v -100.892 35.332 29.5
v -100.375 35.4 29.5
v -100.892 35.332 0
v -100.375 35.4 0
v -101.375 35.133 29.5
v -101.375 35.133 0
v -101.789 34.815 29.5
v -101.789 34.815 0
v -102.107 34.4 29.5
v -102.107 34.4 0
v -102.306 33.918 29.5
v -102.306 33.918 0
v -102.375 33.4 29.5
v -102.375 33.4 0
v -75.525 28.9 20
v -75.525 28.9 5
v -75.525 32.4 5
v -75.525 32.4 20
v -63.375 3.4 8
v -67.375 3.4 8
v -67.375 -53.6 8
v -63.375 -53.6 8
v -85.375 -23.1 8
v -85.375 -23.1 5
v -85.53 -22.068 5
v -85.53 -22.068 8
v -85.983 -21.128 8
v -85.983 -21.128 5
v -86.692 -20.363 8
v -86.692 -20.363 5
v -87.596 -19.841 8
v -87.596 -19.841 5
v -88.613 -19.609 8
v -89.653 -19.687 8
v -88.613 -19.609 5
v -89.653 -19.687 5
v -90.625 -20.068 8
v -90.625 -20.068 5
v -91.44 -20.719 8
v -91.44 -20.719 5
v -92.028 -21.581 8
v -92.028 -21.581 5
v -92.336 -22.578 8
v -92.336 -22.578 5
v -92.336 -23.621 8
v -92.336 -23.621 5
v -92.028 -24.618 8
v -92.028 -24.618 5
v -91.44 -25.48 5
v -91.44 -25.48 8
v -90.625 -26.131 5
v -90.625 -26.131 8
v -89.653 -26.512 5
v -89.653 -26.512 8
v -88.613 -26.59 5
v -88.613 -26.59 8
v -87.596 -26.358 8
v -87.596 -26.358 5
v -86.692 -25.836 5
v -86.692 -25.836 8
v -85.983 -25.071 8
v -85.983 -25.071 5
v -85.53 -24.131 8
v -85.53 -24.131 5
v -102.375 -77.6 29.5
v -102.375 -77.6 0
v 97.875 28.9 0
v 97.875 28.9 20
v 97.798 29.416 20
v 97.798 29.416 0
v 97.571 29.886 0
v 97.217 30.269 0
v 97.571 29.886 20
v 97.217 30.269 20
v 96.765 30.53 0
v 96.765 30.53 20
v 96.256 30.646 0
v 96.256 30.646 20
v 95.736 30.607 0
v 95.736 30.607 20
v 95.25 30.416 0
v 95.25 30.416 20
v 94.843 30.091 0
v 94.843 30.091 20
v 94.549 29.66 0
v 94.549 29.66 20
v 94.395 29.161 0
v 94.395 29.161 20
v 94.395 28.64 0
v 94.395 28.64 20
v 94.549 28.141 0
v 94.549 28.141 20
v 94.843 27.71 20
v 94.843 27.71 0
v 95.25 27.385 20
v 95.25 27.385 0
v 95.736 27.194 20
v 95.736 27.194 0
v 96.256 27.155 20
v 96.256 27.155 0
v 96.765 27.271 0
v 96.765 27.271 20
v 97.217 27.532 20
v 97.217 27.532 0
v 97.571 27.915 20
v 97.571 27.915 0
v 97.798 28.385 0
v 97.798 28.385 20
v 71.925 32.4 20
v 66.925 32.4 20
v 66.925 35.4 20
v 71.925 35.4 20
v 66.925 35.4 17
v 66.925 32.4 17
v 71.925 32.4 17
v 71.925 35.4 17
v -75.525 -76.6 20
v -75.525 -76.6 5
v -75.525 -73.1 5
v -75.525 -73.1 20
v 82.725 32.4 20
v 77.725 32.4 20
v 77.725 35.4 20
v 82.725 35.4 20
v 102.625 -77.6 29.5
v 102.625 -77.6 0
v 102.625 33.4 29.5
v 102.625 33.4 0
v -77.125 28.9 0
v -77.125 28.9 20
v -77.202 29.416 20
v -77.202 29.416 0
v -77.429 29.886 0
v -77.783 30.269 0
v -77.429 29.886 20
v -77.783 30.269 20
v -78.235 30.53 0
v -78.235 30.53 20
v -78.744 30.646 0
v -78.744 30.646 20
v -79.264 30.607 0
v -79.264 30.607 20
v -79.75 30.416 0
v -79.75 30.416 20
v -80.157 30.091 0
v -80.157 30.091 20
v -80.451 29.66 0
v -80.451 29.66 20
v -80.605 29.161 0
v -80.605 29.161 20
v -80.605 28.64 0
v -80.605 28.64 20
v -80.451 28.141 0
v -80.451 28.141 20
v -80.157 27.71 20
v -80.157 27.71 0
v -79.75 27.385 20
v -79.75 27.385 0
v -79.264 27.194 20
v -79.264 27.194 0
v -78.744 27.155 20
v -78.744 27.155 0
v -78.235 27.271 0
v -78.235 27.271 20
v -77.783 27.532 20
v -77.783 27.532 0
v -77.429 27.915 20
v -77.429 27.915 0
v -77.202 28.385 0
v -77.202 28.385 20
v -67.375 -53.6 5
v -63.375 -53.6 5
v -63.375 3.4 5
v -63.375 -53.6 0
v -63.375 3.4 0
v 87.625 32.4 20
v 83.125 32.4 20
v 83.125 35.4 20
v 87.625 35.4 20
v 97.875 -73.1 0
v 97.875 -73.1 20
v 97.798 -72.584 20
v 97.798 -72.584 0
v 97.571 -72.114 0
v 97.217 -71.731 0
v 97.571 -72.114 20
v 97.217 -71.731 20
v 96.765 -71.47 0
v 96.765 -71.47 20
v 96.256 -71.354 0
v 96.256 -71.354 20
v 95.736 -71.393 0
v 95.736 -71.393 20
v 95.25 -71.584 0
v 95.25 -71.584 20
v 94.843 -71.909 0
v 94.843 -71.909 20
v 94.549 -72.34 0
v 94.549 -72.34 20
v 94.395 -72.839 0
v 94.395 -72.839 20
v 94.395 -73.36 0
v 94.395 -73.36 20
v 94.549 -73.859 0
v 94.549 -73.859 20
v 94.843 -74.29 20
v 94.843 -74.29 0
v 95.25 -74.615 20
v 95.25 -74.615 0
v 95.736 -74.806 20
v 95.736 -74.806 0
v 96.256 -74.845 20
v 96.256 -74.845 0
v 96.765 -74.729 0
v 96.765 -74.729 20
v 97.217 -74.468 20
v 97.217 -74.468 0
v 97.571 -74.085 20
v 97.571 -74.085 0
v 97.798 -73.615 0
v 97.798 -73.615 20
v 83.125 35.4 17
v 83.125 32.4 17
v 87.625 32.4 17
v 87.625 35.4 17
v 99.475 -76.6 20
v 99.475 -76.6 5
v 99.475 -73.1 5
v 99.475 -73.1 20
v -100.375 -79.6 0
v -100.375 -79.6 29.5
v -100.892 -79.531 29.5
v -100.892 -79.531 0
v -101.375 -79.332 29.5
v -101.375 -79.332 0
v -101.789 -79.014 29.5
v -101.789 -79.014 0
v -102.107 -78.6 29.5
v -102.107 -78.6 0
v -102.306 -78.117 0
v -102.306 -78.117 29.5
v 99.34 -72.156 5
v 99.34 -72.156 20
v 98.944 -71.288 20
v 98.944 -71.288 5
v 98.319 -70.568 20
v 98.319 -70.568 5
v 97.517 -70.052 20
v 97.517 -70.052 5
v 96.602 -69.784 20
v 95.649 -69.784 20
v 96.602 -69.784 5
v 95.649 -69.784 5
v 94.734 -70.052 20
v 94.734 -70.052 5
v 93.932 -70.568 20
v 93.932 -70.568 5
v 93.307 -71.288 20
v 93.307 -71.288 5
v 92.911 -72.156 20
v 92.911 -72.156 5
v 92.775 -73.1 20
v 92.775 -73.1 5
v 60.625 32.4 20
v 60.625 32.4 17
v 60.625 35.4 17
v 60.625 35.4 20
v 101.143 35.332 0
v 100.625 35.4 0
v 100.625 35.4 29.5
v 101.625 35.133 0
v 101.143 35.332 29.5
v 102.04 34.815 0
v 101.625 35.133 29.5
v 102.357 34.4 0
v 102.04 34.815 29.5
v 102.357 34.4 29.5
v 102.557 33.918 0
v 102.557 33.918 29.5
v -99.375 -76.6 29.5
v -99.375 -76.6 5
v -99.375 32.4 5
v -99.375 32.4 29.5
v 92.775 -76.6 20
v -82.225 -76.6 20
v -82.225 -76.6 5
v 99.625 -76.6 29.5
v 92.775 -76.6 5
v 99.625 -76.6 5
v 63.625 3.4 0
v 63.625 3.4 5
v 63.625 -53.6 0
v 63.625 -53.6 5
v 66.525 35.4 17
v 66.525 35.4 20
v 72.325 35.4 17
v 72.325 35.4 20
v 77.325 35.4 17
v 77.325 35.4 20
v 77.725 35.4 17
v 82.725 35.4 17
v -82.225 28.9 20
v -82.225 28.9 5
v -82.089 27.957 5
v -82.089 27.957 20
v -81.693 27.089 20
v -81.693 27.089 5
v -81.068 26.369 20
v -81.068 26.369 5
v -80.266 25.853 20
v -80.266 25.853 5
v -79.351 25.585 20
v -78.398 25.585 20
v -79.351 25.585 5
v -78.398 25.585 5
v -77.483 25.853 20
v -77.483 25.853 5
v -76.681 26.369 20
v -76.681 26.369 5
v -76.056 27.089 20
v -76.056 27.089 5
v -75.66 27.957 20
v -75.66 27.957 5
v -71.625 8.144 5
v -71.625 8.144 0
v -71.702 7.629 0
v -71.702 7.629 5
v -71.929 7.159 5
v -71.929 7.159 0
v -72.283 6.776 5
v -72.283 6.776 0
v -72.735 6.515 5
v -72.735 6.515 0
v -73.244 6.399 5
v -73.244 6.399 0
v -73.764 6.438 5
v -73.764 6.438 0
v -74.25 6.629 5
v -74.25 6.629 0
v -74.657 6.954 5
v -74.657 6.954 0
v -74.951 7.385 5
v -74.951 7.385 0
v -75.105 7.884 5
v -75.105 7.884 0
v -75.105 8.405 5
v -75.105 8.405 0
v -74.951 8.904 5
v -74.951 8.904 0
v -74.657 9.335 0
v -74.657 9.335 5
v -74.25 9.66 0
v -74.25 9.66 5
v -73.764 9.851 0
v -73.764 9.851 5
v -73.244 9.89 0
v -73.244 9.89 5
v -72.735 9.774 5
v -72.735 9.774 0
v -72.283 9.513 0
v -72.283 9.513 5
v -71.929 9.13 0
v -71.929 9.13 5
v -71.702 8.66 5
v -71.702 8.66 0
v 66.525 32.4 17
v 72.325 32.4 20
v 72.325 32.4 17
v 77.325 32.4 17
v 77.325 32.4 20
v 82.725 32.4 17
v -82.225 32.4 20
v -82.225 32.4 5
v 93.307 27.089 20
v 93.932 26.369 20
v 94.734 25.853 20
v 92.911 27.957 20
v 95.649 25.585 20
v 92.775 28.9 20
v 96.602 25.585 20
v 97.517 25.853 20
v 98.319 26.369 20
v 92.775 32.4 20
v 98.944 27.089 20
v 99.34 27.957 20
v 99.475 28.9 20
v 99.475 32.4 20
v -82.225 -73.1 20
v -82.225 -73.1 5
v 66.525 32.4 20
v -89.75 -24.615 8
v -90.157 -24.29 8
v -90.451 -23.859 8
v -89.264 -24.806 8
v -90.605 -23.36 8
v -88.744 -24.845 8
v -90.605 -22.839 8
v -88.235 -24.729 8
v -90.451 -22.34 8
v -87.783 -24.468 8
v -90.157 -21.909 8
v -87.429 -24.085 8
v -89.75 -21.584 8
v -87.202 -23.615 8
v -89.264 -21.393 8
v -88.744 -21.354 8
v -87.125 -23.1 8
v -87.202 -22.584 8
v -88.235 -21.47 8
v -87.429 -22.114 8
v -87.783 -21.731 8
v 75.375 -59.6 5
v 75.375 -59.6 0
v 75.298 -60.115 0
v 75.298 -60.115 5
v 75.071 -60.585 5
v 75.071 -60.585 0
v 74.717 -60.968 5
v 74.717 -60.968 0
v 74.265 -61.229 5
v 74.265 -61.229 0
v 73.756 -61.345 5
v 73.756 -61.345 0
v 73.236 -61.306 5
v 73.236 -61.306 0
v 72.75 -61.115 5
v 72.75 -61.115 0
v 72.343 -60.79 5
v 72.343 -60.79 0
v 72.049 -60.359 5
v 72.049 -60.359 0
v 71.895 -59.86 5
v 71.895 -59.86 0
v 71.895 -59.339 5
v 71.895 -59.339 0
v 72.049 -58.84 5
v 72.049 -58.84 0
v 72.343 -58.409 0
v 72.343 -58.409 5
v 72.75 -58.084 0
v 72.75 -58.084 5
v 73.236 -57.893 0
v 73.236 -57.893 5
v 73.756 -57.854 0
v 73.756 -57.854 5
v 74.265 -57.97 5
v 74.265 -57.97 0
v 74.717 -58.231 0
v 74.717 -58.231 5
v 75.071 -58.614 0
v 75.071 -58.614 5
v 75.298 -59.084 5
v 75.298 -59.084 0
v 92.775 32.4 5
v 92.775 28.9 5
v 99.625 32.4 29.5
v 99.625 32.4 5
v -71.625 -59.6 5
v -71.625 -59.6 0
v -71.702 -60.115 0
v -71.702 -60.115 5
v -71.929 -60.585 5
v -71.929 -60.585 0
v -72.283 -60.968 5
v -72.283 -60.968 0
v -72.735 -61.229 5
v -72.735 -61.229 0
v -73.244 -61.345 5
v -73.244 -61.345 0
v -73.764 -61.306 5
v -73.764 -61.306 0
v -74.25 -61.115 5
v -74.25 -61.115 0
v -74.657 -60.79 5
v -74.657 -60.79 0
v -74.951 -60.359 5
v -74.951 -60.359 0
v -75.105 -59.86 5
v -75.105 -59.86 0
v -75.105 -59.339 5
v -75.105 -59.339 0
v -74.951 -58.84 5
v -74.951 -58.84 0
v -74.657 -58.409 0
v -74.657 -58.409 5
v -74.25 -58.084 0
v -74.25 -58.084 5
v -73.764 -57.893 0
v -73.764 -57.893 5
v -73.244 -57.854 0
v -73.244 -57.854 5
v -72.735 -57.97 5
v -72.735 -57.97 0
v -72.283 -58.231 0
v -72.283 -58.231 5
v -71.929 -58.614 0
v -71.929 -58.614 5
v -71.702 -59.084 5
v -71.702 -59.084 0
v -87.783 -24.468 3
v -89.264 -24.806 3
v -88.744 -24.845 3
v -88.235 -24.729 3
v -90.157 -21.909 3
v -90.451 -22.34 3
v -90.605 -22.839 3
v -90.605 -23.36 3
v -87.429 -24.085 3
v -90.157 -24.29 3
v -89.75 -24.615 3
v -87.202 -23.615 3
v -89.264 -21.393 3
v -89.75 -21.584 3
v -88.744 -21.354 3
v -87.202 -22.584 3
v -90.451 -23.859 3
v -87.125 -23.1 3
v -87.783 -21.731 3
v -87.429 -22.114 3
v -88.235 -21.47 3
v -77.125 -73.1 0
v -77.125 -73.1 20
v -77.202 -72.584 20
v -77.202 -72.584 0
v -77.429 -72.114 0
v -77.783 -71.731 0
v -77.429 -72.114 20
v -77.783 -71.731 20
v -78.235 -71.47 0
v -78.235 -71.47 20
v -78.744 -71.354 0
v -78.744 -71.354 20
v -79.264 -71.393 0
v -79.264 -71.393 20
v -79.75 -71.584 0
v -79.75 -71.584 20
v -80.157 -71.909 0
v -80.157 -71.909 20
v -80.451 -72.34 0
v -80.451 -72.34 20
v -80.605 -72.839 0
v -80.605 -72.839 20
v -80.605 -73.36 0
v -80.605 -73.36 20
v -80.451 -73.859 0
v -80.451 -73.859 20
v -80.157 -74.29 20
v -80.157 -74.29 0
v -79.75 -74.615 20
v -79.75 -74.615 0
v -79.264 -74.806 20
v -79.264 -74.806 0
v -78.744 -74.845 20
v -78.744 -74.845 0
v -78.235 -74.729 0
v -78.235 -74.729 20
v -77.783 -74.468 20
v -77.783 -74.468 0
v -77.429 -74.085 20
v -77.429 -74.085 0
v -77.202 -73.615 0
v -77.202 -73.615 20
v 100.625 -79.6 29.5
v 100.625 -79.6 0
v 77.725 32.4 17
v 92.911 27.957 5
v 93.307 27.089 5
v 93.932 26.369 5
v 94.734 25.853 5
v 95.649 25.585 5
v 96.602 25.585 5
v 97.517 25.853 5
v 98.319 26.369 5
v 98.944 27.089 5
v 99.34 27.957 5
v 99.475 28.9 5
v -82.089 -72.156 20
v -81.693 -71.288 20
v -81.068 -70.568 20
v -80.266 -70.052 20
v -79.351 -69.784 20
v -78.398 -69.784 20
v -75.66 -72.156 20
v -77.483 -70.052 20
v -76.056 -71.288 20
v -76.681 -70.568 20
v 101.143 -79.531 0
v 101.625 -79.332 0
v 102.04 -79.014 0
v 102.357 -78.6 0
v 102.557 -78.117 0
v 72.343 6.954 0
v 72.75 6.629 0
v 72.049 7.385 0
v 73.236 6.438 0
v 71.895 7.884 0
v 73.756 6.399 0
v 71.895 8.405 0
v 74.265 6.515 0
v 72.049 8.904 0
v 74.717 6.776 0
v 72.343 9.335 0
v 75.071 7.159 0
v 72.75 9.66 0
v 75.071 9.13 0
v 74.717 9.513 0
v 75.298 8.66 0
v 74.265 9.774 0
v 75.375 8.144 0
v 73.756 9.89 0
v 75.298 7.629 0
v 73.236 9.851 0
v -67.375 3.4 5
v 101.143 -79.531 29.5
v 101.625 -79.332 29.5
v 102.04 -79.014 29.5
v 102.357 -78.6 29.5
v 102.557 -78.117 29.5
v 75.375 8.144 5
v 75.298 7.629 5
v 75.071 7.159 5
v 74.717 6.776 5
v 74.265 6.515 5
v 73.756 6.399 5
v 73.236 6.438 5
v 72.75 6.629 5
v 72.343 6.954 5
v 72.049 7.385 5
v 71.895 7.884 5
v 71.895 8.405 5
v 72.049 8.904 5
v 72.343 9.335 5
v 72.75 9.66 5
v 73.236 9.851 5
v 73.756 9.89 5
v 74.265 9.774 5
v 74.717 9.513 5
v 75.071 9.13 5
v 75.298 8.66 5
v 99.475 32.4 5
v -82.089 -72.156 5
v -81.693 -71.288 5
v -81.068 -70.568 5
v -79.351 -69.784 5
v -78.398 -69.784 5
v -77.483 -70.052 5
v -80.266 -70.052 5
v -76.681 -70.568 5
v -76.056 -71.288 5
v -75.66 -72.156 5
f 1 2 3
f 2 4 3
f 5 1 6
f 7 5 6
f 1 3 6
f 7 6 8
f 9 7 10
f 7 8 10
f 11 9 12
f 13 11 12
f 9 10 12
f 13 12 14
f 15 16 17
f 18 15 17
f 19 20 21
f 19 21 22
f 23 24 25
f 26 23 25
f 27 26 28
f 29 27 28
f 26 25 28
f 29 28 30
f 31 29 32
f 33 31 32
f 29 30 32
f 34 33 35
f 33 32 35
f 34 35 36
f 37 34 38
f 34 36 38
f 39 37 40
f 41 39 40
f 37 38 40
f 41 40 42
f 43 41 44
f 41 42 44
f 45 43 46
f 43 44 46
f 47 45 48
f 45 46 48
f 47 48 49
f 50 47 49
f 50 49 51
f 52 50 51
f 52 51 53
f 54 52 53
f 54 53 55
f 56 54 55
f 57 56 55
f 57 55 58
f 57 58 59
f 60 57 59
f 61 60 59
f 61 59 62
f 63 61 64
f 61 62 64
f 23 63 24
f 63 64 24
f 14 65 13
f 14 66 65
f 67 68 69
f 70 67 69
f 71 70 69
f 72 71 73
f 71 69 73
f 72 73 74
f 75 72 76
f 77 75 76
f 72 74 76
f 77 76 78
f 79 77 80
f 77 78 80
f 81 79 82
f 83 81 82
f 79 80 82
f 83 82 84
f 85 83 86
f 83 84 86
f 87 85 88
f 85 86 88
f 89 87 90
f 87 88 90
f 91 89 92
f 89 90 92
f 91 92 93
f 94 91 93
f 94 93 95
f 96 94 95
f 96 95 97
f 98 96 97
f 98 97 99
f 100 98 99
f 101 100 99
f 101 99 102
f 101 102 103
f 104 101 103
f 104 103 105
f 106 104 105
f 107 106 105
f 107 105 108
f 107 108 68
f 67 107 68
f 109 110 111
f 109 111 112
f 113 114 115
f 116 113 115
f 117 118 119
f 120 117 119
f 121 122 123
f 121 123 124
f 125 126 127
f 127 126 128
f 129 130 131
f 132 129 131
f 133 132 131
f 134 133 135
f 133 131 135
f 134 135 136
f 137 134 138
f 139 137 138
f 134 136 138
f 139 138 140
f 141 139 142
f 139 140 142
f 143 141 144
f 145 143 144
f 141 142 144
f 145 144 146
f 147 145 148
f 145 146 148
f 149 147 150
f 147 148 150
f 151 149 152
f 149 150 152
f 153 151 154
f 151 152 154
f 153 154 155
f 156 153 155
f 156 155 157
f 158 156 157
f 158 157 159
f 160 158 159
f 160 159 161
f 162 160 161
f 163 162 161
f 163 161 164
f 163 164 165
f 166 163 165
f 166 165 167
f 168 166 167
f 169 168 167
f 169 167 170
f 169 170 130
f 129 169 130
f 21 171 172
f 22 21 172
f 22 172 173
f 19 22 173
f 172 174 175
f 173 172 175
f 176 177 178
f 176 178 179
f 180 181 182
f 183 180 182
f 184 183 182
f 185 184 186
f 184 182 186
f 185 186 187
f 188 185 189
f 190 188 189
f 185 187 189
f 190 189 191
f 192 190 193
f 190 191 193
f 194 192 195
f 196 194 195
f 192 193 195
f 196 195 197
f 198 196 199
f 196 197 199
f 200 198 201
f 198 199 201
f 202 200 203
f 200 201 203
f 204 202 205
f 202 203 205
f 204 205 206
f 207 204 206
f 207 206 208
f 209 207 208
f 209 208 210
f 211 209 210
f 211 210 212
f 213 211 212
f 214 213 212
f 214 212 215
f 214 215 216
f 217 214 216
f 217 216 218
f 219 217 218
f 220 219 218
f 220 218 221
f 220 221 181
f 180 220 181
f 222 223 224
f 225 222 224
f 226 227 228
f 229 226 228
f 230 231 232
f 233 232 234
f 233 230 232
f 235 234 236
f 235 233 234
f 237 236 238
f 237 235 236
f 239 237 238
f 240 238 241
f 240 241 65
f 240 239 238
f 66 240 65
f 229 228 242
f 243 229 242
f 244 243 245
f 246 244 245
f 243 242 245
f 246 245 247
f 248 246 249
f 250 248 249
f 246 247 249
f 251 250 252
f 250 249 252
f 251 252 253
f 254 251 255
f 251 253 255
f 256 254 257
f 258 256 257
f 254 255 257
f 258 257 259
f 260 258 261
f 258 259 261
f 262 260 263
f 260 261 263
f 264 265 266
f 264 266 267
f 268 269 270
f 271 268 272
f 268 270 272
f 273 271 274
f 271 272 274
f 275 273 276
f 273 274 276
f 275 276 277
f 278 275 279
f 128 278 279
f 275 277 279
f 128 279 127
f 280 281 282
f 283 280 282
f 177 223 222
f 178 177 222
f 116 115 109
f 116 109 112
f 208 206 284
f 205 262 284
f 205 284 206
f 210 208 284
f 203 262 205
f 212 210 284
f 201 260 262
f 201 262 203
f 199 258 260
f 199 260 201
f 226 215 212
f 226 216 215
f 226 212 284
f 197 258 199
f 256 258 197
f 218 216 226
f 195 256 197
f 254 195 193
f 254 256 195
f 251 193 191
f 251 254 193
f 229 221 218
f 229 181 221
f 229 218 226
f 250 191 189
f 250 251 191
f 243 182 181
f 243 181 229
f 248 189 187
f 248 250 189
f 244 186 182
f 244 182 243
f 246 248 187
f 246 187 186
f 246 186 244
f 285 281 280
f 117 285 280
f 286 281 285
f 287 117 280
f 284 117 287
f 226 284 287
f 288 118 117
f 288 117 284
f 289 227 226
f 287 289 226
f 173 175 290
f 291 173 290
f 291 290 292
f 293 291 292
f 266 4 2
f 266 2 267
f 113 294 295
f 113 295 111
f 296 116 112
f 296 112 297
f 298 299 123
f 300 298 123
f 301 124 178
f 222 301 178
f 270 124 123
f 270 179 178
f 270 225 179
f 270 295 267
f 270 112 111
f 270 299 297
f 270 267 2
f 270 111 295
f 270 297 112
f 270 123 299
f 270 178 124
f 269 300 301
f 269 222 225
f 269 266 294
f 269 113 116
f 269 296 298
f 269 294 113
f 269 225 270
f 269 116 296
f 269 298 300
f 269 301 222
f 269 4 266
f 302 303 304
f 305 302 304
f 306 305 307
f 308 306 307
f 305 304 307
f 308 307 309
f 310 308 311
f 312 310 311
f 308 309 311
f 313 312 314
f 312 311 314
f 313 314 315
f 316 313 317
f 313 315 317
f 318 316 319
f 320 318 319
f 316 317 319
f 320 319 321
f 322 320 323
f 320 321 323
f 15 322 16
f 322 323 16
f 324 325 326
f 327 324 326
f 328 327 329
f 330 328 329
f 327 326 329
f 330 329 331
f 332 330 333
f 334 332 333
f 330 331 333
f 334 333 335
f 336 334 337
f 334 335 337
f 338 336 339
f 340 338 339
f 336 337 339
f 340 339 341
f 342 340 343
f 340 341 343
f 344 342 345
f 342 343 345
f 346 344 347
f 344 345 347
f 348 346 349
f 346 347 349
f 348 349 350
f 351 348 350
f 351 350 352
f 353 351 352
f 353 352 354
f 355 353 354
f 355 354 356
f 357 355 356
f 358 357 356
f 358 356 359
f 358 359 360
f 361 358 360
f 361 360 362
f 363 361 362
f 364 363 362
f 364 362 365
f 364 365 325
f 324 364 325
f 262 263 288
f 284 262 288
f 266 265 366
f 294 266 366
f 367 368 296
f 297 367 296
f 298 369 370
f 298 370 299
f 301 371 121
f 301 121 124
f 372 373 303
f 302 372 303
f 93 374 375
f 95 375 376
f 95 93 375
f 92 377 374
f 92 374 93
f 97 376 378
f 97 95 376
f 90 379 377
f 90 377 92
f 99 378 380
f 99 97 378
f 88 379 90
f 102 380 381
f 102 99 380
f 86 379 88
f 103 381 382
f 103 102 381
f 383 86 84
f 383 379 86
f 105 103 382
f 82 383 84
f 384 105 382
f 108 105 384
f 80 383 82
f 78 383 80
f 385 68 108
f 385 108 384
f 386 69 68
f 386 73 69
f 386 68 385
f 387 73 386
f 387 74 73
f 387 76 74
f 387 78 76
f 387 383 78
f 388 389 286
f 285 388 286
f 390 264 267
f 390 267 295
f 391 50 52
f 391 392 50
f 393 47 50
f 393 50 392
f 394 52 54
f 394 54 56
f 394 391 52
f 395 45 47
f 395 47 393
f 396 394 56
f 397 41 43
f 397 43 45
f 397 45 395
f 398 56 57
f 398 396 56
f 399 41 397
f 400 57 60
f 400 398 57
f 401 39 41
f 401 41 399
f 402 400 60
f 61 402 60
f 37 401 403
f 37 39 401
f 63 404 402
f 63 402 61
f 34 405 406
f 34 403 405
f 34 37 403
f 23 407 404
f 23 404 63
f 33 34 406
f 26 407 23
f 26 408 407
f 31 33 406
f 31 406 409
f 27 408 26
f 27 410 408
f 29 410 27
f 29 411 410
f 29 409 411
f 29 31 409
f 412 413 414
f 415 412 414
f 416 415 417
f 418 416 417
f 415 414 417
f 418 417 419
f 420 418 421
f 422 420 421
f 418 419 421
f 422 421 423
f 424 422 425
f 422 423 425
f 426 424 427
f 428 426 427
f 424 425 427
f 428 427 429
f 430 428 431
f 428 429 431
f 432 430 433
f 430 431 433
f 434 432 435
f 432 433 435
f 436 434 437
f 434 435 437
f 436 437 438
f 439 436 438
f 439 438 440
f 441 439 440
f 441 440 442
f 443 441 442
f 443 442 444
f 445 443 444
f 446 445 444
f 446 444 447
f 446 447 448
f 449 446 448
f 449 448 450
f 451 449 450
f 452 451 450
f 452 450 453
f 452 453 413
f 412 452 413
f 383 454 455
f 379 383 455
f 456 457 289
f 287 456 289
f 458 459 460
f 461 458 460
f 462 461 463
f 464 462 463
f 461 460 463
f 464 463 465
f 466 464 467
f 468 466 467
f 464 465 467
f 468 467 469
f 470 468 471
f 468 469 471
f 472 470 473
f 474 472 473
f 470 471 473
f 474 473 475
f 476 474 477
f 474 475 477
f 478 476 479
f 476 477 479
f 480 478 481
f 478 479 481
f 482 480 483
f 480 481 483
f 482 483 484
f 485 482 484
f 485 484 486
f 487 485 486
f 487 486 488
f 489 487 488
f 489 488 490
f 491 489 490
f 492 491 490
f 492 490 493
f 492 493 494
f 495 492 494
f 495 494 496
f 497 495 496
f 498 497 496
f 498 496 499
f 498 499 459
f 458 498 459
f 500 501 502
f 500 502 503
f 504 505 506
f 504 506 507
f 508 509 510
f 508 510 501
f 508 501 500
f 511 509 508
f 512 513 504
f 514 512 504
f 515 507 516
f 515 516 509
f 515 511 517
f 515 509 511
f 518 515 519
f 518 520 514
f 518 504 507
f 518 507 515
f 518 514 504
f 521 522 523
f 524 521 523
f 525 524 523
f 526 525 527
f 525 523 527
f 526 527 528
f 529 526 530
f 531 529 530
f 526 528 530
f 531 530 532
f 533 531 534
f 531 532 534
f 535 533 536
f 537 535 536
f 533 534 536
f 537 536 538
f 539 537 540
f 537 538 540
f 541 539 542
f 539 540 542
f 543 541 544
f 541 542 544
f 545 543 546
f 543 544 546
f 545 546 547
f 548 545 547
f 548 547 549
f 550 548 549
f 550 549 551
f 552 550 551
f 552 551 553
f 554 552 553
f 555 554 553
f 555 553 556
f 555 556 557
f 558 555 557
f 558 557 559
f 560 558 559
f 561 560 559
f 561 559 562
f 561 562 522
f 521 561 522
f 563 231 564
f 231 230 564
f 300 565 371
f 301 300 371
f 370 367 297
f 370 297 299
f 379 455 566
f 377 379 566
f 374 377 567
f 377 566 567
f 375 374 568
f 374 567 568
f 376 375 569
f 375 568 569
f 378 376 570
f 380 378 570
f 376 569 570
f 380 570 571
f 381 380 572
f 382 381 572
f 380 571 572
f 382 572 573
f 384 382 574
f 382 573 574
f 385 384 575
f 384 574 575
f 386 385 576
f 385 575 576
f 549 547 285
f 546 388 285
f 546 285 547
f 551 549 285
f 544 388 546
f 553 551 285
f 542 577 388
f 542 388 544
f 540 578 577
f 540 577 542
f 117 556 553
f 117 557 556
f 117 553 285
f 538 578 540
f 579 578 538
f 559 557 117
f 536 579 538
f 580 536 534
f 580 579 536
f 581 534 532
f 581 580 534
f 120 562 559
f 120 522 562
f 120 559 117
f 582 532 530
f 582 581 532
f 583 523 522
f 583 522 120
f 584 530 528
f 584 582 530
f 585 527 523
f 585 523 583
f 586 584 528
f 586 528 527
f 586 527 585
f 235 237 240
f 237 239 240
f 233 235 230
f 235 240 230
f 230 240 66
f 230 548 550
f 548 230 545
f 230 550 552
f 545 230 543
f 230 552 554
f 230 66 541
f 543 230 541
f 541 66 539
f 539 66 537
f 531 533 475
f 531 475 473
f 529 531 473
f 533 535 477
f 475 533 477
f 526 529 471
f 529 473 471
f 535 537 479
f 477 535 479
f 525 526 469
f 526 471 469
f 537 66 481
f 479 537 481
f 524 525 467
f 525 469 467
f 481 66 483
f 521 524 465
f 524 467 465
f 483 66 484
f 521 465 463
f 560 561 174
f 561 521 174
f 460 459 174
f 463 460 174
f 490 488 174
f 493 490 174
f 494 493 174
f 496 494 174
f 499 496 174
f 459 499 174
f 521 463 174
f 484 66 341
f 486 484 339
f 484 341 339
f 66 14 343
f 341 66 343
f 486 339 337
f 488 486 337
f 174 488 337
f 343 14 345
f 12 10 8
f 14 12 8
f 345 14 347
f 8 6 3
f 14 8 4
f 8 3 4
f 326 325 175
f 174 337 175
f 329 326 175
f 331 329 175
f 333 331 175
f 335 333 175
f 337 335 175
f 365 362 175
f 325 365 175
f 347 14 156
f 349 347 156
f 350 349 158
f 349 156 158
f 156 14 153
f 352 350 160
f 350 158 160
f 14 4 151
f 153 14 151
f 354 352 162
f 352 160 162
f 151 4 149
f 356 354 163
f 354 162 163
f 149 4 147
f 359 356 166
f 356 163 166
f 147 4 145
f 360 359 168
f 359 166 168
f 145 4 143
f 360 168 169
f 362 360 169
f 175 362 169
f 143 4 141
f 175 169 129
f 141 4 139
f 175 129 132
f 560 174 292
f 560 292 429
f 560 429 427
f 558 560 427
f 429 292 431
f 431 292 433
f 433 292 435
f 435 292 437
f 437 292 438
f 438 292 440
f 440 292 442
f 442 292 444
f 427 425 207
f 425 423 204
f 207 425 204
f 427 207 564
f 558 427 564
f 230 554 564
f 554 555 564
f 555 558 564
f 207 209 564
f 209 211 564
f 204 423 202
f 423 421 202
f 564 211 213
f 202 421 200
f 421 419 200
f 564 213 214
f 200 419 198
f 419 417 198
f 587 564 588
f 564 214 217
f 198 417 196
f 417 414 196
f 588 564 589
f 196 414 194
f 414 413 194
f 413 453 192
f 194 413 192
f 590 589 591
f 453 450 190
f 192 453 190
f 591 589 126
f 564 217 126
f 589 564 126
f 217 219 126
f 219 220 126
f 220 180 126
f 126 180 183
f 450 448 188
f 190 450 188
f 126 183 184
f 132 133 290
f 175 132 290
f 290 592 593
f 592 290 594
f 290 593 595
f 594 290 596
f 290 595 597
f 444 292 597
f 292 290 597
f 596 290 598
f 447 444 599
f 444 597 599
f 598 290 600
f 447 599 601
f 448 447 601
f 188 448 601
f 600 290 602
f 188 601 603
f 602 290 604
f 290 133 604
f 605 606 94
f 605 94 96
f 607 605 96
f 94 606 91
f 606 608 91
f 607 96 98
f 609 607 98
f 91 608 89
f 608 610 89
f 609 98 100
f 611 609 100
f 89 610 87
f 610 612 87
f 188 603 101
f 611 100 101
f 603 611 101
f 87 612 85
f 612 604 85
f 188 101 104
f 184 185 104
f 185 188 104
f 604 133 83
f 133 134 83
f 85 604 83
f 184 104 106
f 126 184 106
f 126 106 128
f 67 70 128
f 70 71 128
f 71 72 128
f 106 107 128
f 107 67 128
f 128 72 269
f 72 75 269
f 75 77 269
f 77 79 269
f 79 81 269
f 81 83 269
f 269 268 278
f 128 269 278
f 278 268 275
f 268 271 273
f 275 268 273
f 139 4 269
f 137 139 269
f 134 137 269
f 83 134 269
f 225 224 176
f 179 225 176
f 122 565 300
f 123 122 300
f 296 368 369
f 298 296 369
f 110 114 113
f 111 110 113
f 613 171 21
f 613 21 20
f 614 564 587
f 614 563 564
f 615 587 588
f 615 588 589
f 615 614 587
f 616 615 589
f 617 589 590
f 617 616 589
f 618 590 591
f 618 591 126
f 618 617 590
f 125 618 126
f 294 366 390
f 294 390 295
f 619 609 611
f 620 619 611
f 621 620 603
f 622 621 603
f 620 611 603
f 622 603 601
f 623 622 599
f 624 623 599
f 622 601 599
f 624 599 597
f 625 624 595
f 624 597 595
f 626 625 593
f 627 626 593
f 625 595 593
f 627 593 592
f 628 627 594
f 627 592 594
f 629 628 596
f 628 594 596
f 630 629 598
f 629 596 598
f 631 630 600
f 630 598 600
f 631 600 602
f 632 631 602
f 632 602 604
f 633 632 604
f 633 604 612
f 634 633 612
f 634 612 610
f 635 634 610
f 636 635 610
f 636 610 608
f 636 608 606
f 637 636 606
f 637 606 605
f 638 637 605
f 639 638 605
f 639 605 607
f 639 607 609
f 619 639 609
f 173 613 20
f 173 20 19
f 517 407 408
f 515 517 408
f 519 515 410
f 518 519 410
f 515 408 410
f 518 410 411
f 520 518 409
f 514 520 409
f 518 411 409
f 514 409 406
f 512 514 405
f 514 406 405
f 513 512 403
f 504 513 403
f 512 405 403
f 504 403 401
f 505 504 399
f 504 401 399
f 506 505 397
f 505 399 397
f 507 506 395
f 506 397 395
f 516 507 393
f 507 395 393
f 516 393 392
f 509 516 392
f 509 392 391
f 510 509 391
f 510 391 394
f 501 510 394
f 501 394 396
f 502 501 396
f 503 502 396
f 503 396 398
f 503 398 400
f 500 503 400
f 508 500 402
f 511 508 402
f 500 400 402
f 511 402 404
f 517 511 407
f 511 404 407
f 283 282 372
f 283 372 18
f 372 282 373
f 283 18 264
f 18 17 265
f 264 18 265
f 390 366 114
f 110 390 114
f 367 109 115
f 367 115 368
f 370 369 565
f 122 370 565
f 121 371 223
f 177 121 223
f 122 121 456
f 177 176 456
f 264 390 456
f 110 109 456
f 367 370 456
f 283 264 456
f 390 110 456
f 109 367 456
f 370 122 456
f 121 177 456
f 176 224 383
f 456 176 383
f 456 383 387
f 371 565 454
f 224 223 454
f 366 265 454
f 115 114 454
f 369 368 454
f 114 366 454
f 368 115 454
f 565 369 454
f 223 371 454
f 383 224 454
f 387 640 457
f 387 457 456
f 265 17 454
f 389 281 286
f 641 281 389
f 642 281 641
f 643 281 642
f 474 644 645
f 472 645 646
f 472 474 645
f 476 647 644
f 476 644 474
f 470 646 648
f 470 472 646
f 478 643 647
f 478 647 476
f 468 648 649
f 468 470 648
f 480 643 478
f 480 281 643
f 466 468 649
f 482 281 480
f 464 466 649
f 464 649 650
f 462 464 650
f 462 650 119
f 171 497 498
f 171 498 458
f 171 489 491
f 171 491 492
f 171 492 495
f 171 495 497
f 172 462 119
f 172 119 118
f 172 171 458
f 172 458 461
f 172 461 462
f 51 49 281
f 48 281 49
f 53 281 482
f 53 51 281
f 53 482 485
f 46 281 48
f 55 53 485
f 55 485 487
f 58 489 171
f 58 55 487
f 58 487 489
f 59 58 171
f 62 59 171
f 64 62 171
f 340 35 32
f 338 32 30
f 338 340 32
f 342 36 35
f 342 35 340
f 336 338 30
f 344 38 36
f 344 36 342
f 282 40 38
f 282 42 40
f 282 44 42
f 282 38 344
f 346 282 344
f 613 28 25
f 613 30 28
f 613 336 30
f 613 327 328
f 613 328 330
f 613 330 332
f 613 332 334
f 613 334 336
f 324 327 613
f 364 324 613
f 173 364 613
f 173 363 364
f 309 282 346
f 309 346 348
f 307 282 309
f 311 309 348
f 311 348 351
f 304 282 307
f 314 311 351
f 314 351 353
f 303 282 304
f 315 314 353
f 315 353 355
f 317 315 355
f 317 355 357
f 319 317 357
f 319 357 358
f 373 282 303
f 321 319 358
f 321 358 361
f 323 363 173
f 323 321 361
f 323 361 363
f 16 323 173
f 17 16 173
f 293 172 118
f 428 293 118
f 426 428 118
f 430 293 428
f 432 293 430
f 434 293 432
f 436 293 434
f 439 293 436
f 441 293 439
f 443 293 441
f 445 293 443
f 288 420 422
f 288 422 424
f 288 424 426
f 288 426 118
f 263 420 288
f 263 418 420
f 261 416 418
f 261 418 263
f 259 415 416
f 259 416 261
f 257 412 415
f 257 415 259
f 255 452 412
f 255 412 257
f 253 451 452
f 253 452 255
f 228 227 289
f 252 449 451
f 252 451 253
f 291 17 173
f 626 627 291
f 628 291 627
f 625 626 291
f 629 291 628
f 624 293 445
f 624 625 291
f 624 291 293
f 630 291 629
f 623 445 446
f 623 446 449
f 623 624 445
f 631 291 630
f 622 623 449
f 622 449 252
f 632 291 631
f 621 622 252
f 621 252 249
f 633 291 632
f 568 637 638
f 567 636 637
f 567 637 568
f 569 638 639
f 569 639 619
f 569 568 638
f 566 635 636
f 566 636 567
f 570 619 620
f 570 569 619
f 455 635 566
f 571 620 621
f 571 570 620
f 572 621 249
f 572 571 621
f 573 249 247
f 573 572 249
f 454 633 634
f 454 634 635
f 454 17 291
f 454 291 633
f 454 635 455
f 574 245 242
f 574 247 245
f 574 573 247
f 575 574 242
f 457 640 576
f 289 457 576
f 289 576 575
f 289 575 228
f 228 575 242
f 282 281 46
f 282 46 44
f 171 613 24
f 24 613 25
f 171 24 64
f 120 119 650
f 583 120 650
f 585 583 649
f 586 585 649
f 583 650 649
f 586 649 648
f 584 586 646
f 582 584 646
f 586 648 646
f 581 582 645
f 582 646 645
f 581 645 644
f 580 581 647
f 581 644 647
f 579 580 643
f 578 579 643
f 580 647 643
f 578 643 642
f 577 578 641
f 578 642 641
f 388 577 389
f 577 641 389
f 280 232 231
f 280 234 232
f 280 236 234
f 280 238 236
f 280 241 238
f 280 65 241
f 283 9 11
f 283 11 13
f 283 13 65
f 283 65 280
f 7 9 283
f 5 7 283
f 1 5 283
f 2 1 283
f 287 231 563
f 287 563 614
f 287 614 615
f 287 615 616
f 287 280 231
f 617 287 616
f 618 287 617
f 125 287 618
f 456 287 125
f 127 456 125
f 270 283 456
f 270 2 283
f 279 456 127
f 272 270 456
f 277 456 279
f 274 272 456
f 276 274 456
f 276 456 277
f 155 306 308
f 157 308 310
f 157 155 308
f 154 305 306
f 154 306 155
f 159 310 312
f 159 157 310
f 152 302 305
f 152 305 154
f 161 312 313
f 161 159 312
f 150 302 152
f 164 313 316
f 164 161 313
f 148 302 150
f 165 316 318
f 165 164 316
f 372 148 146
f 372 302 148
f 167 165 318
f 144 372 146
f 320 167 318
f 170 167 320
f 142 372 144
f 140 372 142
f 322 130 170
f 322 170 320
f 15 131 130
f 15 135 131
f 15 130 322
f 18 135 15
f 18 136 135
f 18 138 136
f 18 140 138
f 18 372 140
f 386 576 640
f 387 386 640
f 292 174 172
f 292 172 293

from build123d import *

# Parameters (mm, degrees)
F0_W      = 205
F0_H      = 115
F1_DEPTH  = 5
F2_R      = 1.75
F3_DEPTH  = 25
F4_W      = 127
F4_H      = 57
F5_DEPTH  = 25
F7_DEPTH  = 15
F9_DEPTH  = 3
F10_W     = 4
F10_H     = 57
F11_DEPTH = 3
F12_R     = 1.75
F13_DEPTH = 25
F14_R     = 1.75
F15_DEPTH = 25
F16_R     = 1.75
F17_DEPTH = 25
F18_R     = 1.75
F19_DEPTH = 25
F20_R     = 1.75
F21_DEPTH = 5
F22_W     = 168.3
F22_H     = 3
F23_DEPTH = 24.5
F24_R     = 2
F25_W     = 27
F25_H     = 3
F26_DEPTH = 25
F27_W     = 0.4
F27_H     = 3
F28_DEPTH = 3
F29_W     = 6.7
F29_H     = 3
F30_DEPTH = 9.5
F31_W     = 6.7
F31_H     = 3
F32_DEPTH = 9.5
F33_W     = 6.7
F33_H     = 3
F34_DEPTH = 9.5
F35_W     = 6.7
F35_H     = 3
F36_DEPTH = 9.5


# Not quite as in the source:
# - a feature names something its author has since deleted; it is built from what else it names


with BuildPart() as f1:
    # F0 (on Top) → F1 (new body)
    with BuildSketch(Plane.XY):
        with Locations((0.1253969967, -22.0995221115)):
            Rectangle(F0_W, F0_H)
    extrude(amount=F1_DEPTH)

    # F2 (on face) → F3 (cut)
    with BuildSketch(Plane(origin=(0, 0, 0), x_dir=(1, 0, 0), z_dir=(0, 0, -1))):
        with Locations((-73.3746030033, 59.5995221115)):
            Circle(F2_R)
        with Locations((-73.3746030033, -8.1444778885)):
            Circle(F2_R)
        with Locations((73.6253969967, 59.5995221115)):
            Circle(F2_R)
        with Locations((73.6253969967, -8.1444778885)):
            Circle(F2_R)
    extrude(amount=-F3_DEPTH, mode=Mode.SUBTRACT)

    # F4 (on face) → F5 (cut)
    with BuildSketch(Plane(origin=(0, 0, 0), x_dir=(1, 0, 0), z_dir=(0, 0, -1))):
        with Locations((0.1253969967, 25.0995221115)):
            Rectangle(F4_W, F4_H)
    extrude(amount=-F5_DEPTH, mode=Mode.SUBTRACT)

    # F6 (on face) → F7 (join)
    with BuildSketch(Plane.XY.offset(5)):
        with BuildLine():
            Line((96.1253969967, -73.0995221115), (99.4753969967, -73.0995221115))
            ThreePointArc((99.4753969967, -73.0995221115), (96.1253969967, -69.7495221115), (92.7753969967, -73.0995221115))
            Line((92.7753969967, -73.0995221115), (96.1253969967, -73.0995221115))
        make_face()
        with BuildLine():
            ThreePointArc((92.7753969967, -73.0995221115), (96.1253969967, -76.4495221115), (99.4753969967, -73.0995221115))
            Line((99.4753969967, -73.0995221115), (96.1253969967, -73.0995221115))
            Line((96.1253969967, -73.0995221115), (92.7753969967, -73.0995221115))
        make_face()
        with BuildLine():
            Line((-78.8746030033, -73.0995221115), (-75.5246030033, -73.0995221115))
            ThreePointArc((-75.5246030033, -73.0995221115), (-78.8746030033, -69.7495221115), (-82.2246030033, -73.0995221115))
            Line((-82.2246030033, -73.0995221115), (-78.8746030033, -73.0995221115))
        make_face()
        with BuildLine():
            ThreePointArc((-82.2246030033, -73.0995221115), (-78.8746030033, -76.4495221115), (-75.5246030033, -73.0995221115))
            Line((-75.5246030033, -73.0995221115), (-78.8746030033, -73.0995221115))
            Line((-78.8746030033, -73.0995221115), (-82.2246030033, -73.0995221115))
        make_face()
        with BuildLine():
            Line((96.1253969967, 28.9004778885), (99.4753969967, 28.9004778885))
            ThreePointArc((99.4753969967, 28.9004778885), (96.1253969967, 32.2504778885), (92.7753969967, 28.9004778885))
            Line((92.7753969967, 28.9004778885), (96.1253969967, 28.9004778885))
        make_face()
        with BuildLine():
            ThreePointArc((92.7753969967, 28.9004778885), (96.1253969967, 25.5504778885), (99.4753969967, 28.9004778885))
            Line((99.4753969967, 28.9004778885), (96.1253969967, 28.9004778885))
            Line((96.1253969967, 28.9004778885), (92.7753969967, 28.9004778885))
        make_face()
        with BuildLine():
            ThreePointArc((-82.2246030033, 28.9004778885), (-78.8746030033, 25.5504778885), (-75.5246030033, 28.9004778885))
            ThreePointArc((-75.5246030033, 28.9004778885), (-78.8746030033, 32.2504778885), (-82.2246030033, 28.9004778885))
        make_face()
        with BuildLine():
            Line((-82.2246030033, -79.5995221115), (-75.5246030033, -79.5995221115))
            Line((-75.5246030033, -79.5995221115), (-75.5246030033, -73.0995221115))
            ThreePointArc((-75.5246030033, -73.0995221115), (-78.8746030033, -76.4495221115), (-82.2246030033, -73.0995221115))
            Line((-82.2246030033, -73.0995221115), (-82.2246030033, -79.5995221115))
        make_face()
        with BuildLine():
            Line((-75.5246030033, 28.9004778885), (-75.5246030033, 35.4004778885))
            Line((-75.5246030033, 35.4004778885), (-82.2246030033, 35.4004778885))
            Line((-82.2246030033, 35.4004778885), (-82.2246030033, 28.9004778885))
            ThreePointArc((-82.2246030033, 28.9004778885), (-78.8746030033, 32.2504778885), (-75.5246030033, 28.9004778885))
        make_face()
        with BuildLine():
            Line((99.4753969967, 28.9004778885), (99.4753969967, 35.4004778885))
            Line((99.4753969967, 35.4004778885), (92.7753969967, 35.4004778885))
            Line((92.7753969967, 35.4004778885), (92.7753969967, 28.9004778885))
            ThreePointArc((92.7753969967, 28.9004778885), (96.1253969967, 32.2504778885), (99.4753969967, 28.9004778885))
        make_face()
        with BuildLine():
            Line((99.4753969967, -79.5995221115), (99.4753969967, -73.0995221115))
            ThreePointArc((99.4753969967, -73.0995221115), (96.1253969967, -76.4495221115), (92.7753969967, -73.0995221115))
            Line((92.7753969967, -73.0995221115), (92.7753969967, -79.5995221115))
            Line((92.7753969967, -79.5995221115), (99.4753969967, -79.5995221115))
        make_face()
    extrude(amount=F7_DEPTH)

    # F8 (on face) → F9 (join)
    with BuildSketch(Plane.XY.offset(5)):
        with BuildLine():
            ThreePointArc((-92.3746030033, -23.0995221115), (-88.8746030033, -26.5995221115), (-85.3746030033, -23.0995221115))
            Line((-85.3746030033, -23.0995221115), (-92.3746030033, -23.0995221115))
        make_face()
        with BuildLine():
            Line((-92.3746030033, -23.0995221115), (-85.3746030033, -23.0995221115))
            ThreePointArc((-85.3746030033, -23.0995221115), (-88.8746030033, -19.5995221115), (-92.3746030033, -23.0995221115))
        make_face()
    extrude(amount=F9_DEPTH)

    # F10 (on face) → F11 (join)
    with BuildSketch(Plane.XY.offset(5)):
        with Locations((-65.3746030033, -25.0995221115)):
            Rectangle(F10_W, F10_H)
    extrude(amount=F11_DEPTH)

    # F12 (on face) → F13 (cut)
    with BuildSketch(Plane.XY.offset(20)):
        with Locations((-78.8746030033, -73.0995221115)):
            Circle(F12_R)
    extrude(amount=-F13_DEPTH, mode=Mode.SUBTRACT)

    # F14 (on face) → F15 (cut)
    with BuildSketch(Plane.XY.offset(20)):
        with Locations((-78.8746030033, 28.9004778885)):
            Circle(F14_R)
    extrude(amount=-F15_DEPTH, mode=Mode.SUBTRACT)

    # F16 (on face) → F17 (cut)
    with BuildSketch(Plane.XY.offset(20)):
        with Locations((96.1253969967, -73.0995221115)):
            Circle(F16_R)
    extrude(amount=-F17_DEPTH, mode=Mode.SUBTRACT)

    # F18 (on face) → F19 (cut)
    with BuildSketch(Plane.XY.offset(20)):
        with Locations((96.1253969967, 28.9004778885)):
            Circle(F18_R)
    extrude(amount=-F19_DEPTH, mode=Mode.SUBTRACT)

    # F20 (on face) → F21 (cut)
    with BuildSketch(Plane.XY.offset(8)):
        with Locations((-88.8746030033, -23.0995221115)):
            Circle(F20_R)
    extrude(amount=-F21_DEPTH, mode=Mode.SUBTRACT)

    # F22 (on face) → F23 (join)
    with BuildSketch(Plane.XY.offset(5)):
        Polygon((99.4753969967, -79.5995221115), (102.6253969967, -79.5995221115), (102.6253969967, 35.4004778885), (99.4753969967, 35.4004778885), (99.4753969967, 32.4004778885), (99.6253969967, 32.4004778885), (99.6253969967, -76.5995221115), (99.4753969967, -76.5995221115), align=None)
        Polygon((-102.3746030033, -79.5995221115), (-82.2246030033, -79.5995221115), (-82.2246030033, -76.5995221115), (-99.3746030033, -76.5995221115), (-99.3746030033, 32.4004778885), (-82.2246030033, 32.4004778885), (-82.2246030033, 35.4004778885), (-102.3746030033, 35.4004778885), align=None)
        with Locations((8.6253969967, -78.0995221115)):
            Rectangle(F22_W, F22_H)
        with Locations((8.6253969967, 33.9004778885)):
            Rectangle(F22_W, F22_H)
    extrude(amount=F23_DEPTH)

    # F24
    f24_edges = [f1.edges().sort_by_distance(p)[0] for p in [
        (-102.374603, -79.599522, 14.75),
        (102.625397, -79.599522, 14.75),
        (102.625397, 35.400478, 14.75),
        (-102.374603, 35.400478, 14.75),
    ]]
    fillet(f24_edges, radius=F24_R)

    # F25 (on face) → F26 (cut)
    with BuildSketch(Plane.XZ.offset(-32.4004778885)):
        with Locations((74.1253969967, 18.5)):
            Rectangle(F25_W, F25_H)
    extrude(amount=-F26_DEPTH, mode=Mode.SUBTRACT)

    # F27 (on face) → F28 (join)
    with BuildSketch(Plane.XY.offset(17)):
        with Locations((82.9253969967, 33.9004778885)):
            Rectangle(F27_W, F27_H)
        with Locations((77.5253969967, 33.9004778885)):
            Rectangle(F27_W, F27_H)
        with Locations((72.1253969967, 33.9004778885)):
            Rectangle(F27_W, F27_H)
        with Locations((66.7253969967, 33.9004778885)):
            Rectangle(F27_W, F27_H)
    extrude(amount=F28_DEPTH)

    # F29 (on face) → F30 (join)
    with BuildSketch(Plane.XY.offset(20)):
        with Locations((-78.8746030033, -78.0995221115)):
            Rectangle(F29_W, F29_H)
    extrude(amount=F30_DEPTH)

    # F31 (on face) → F32 (join)
    with BuildSketch(Plane.XY.offset(20)):
        with Locations((96.1253969967, -78.0995221115)):
            Rectangle(F31_W, F31_H)
    extrude(amount=F32_DEPTH)

    # F33 (on face) → F34 (join)
    with BuildSketch(Plane.XY.offset(20)):
        with Locations((96.1253969967, 33.9004778885)):
            Rectangle(F33_W, F33_H)
    extrude(amount=F34_DEPTH)

    # F35 (on face) → F36 (join)
    with BuildSketch(Plane.XY.offset(20)):
        with Locations((-78.8746030033, 33.9004778885)):
            Rectangle(F35_W, F35_H)
    extrude(amount=F36_DEPTH)


solid = f1.part
